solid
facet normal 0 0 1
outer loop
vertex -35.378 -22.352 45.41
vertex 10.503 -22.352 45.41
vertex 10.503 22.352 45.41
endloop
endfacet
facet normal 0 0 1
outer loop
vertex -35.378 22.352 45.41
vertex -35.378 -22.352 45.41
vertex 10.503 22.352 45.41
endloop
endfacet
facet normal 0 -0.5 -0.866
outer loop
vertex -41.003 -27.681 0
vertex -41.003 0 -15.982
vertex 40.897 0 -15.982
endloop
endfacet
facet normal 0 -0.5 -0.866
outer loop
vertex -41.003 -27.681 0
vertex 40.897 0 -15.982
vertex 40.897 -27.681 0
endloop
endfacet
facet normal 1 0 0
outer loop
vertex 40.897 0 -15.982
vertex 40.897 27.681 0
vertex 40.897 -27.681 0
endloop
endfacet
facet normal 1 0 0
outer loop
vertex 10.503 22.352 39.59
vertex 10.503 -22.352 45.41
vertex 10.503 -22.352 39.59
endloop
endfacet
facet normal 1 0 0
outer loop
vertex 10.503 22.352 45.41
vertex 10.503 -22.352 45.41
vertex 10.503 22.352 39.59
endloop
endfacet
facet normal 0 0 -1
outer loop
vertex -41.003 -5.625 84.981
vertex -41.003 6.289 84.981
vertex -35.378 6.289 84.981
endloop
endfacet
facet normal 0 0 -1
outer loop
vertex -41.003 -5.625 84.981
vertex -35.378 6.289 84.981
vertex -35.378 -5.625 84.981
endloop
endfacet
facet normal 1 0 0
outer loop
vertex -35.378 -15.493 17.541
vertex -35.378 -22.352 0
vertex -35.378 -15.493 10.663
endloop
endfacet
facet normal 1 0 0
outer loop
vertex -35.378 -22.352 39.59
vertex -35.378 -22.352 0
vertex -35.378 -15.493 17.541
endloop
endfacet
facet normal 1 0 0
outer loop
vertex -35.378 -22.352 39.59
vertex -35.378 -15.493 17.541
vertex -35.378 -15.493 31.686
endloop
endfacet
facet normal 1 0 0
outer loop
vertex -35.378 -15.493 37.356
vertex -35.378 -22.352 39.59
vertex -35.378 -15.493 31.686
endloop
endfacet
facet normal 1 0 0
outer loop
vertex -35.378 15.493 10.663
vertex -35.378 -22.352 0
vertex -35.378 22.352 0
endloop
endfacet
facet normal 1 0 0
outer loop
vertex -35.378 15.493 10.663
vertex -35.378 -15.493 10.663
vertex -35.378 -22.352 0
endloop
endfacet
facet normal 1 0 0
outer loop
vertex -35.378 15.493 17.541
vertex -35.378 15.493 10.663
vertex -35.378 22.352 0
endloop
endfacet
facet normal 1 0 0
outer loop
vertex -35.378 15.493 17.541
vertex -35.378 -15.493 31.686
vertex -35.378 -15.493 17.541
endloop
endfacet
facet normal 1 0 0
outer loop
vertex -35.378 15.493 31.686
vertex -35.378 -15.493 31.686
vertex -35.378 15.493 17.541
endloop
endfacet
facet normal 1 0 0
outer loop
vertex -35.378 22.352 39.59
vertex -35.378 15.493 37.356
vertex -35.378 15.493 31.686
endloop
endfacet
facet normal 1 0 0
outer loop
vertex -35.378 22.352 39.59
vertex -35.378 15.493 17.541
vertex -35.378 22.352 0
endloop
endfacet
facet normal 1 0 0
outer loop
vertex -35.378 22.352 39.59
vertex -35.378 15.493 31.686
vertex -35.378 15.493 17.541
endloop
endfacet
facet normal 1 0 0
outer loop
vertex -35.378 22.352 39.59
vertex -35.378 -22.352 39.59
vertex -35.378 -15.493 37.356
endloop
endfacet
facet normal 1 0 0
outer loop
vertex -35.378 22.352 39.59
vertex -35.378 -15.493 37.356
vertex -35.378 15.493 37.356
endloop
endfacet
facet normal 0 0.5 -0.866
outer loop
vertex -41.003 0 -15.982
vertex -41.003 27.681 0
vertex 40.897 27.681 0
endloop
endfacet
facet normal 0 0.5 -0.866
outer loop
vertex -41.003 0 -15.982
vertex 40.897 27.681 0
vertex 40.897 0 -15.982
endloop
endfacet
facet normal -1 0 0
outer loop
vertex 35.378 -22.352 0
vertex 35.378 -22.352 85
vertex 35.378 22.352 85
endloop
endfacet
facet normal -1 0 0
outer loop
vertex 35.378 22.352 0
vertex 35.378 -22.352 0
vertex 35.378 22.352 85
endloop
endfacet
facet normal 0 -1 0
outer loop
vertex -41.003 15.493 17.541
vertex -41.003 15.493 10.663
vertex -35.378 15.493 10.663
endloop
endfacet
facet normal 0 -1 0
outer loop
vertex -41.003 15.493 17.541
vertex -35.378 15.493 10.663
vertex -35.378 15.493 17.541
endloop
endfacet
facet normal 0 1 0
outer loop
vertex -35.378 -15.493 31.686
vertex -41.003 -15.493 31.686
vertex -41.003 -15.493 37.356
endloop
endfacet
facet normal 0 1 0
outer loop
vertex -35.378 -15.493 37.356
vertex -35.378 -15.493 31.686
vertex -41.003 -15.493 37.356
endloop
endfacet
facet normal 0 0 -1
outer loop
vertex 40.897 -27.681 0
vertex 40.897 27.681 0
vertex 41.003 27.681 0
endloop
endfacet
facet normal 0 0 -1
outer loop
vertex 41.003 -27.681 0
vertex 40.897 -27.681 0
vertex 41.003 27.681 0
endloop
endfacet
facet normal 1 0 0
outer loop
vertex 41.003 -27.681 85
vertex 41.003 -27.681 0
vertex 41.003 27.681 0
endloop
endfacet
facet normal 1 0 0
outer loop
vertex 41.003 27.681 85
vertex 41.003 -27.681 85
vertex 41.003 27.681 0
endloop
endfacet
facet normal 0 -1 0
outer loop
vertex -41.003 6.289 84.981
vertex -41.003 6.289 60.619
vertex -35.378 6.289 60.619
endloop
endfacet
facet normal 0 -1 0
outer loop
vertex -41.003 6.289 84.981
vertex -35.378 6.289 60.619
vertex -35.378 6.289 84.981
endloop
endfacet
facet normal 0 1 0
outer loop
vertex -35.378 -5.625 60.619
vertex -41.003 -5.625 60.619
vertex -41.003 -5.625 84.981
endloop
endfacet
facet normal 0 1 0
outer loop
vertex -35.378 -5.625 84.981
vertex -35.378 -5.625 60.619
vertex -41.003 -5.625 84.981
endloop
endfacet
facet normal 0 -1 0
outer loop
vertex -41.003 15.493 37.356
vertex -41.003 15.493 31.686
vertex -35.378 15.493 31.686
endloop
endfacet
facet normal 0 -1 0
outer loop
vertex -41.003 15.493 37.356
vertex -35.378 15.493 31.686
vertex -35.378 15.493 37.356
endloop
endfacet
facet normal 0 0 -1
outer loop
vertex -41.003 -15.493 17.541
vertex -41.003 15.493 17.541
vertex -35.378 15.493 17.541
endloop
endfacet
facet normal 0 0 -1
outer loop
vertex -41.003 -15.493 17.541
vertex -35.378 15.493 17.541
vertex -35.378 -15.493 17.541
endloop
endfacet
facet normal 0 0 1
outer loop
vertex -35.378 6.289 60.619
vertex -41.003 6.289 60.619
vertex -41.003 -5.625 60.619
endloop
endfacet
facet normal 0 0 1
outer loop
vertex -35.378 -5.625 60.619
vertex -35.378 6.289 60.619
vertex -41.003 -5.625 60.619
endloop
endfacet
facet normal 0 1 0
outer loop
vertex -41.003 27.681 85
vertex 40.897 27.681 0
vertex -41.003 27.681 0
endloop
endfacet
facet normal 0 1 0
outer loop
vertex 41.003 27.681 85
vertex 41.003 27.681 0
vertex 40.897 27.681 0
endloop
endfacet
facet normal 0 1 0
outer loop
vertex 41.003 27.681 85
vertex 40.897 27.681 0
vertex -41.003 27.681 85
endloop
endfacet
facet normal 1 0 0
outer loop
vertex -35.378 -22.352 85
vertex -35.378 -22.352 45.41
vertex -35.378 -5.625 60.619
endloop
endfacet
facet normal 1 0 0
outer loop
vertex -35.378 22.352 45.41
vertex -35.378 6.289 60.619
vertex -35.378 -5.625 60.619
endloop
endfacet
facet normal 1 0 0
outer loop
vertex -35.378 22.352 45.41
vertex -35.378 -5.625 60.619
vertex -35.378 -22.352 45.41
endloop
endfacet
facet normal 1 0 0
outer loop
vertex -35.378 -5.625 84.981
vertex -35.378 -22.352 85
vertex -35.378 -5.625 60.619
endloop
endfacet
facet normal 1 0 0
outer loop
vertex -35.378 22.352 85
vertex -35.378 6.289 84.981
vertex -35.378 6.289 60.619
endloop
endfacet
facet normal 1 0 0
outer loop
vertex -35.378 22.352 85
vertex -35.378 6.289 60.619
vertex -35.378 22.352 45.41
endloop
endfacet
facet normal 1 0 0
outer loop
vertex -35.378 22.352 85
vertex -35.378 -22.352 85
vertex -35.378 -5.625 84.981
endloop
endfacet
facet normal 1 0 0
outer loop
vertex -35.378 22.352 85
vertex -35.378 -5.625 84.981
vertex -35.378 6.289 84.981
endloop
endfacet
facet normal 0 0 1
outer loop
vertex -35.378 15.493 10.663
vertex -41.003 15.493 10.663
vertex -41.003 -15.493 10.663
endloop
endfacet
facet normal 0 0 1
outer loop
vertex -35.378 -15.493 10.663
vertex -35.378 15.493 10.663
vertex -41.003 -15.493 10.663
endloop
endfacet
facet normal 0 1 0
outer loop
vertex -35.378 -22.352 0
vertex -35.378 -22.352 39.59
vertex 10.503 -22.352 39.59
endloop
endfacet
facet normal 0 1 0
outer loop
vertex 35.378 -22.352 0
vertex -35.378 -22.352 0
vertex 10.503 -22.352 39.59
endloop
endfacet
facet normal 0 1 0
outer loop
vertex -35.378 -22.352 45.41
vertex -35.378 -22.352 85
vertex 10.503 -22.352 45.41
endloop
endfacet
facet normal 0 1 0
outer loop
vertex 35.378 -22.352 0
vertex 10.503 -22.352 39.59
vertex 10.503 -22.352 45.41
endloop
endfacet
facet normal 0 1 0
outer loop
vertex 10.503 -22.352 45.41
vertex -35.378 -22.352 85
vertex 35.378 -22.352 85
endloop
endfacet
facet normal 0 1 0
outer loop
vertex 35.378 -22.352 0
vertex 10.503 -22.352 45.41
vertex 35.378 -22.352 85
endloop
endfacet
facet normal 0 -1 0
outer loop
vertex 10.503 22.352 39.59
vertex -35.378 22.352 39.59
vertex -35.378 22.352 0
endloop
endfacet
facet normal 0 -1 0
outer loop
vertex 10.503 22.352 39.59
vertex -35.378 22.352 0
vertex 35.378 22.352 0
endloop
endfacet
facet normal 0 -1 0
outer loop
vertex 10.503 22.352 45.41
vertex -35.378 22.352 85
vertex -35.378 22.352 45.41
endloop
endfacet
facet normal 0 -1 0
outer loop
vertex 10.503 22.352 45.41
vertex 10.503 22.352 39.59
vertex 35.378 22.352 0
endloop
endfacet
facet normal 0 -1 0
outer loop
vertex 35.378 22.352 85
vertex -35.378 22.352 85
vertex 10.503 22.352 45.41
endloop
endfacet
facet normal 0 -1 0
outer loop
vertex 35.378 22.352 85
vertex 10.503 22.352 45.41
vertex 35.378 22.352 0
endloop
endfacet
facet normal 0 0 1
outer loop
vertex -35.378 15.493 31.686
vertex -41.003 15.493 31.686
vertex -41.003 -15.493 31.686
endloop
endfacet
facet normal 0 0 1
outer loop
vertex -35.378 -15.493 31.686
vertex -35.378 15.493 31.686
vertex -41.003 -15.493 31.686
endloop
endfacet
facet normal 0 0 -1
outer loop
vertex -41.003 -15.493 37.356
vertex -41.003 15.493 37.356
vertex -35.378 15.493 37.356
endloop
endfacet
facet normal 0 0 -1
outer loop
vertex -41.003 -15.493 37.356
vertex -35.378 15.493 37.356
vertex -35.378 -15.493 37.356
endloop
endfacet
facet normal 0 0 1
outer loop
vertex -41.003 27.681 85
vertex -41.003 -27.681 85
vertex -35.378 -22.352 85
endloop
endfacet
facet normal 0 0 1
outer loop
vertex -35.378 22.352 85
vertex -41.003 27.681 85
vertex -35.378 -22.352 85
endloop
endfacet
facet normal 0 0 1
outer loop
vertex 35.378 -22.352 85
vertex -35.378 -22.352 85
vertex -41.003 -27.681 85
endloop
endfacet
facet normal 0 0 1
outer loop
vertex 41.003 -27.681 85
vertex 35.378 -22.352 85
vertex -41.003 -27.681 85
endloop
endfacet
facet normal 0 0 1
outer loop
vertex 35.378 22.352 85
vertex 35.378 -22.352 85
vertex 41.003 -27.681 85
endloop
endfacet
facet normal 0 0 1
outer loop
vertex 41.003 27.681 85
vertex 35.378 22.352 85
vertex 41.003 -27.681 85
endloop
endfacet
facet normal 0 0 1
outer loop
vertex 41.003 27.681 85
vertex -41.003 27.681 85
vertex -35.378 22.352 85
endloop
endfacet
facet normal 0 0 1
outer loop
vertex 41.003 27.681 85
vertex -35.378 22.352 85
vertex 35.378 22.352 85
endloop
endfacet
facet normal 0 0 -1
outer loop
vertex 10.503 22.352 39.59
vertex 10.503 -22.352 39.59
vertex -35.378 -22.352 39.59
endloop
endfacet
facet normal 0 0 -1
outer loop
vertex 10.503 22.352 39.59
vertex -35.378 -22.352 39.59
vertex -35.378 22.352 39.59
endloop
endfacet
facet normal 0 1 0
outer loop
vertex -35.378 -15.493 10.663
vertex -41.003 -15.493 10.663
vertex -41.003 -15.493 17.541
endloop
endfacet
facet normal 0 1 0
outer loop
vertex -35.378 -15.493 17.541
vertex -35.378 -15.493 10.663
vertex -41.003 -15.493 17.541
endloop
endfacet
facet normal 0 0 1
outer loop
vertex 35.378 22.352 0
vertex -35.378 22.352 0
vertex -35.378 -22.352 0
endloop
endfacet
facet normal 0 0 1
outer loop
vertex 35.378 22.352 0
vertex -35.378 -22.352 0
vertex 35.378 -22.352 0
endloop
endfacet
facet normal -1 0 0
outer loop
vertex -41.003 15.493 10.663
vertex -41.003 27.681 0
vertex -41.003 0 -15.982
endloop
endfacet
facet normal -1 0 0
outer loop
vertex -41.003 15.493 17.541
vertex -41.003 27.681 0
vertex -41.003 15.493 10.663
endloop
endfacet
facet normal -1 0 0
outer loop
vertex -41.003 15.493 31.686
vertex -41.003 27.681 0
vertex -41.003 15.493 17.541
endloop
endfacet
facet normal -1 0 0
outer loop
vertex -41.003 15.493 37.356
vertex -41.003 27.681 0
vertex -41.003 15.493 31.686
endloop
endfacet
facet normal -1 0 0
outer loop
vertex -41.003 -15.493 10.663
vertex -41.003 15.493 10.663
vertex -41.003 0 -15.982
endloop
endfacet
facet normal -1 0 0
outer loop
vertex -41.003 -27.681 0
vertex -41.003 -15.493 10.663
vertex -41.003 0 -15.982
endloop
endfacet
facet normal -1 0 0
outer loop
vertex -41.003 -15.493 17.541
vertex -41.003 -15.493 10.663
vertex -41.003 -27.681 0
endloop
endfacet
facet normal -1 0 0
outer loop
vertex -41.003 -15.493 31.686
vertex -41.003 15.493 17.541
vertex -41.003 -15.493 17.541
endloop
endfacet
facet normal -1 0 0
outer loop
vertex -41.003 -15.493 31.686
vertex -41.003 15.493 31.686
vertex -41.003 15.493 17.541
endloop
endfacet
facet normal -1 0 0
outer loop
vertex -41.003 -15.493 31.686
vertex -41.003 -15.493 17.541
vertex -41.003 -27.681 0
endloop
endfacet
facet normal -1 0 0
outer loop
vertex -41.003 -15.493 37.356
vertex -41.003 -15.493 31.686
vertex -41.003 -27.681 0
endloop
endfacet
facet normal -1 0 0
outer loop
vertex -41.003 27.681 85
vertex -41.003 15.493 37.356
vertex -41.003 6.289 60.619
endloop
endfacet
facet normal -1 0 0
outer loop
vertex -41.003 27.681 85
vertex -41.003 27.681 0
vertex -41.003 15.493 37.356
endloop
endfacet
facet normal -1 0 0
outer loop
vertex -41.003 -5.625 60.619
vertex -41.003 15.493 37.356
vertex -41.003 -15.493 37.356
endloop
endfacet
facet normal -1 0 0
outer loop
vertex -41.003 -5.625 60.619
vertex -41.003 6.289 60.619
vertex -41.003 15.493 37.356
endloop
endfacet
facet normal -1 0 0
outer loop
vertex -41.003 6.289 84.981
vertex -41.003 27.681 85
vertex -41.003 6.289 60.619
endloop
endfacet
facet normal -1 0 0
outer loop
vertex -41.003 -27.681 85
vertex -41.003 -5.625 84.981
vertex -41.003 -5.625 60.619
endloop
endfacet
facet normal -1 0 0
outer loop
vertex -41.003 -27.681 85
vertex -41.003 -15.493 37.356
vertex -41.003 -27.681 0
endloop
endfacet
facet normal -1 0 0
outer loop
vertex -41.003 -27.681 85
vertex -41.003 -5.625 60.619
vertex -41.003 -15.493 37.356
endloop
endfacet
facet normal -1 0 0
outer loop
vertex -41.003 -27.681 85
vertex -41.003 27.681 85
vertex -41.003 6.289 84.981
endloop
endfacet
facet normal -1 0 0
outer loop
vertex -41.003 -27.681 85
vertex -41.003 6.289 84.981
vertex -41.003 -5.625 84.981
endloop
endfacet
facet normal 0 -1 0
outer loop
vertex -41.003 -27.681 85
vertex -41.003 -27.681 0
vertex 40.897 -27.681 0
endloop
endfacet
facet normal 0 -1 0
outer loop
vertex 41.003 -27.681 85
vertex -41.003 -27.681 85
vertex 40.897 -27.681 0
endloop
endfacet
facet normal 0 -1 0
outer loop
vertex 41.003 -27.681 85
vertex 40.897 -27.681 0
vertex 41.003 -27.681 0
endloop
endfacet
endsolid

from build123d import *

# Parameters (mm, degrees)
F0_W     = 82.0065811276
F0_H     = 55.3618445992
F1_DEPTH = 85
F3_DEPTH = 81.9
F4_W     = 70.7565844059
F4_H     = 44.7039492428
F5_DEPTH = 85
F6_W     = 30.9852808714
F6_H     = 6.8782754242
F6_H_2   = 5.6699812412
F6_W_2   = 11.9137810543
F6_H_3   = 24.3619084358
F7_DEPTH = 55
F9_START = -30.5
F8_W     = 55.3618445992
F8_H     = 5.8199772239
F9_DEPTH = 48


with BuildPart() as f1:
    # F0 (on Top) → F1 (new body)
    with BuildSketch(Plane.XY):
        Rectangle(F0_W, F0_H)
    extrude(amount=F1_DEPTH)

    # F2 (on face) → F3 (join)
    with BuildSketch(Plane(origin=(-41.0032905638, 0, 0), x_dir=(0, -1, 0), z_dir=(-1, 0, 0))):
        Polygon((27.6809222996, 0), (-27.6809222996, 0), (0, -15.9815879411), align=None)
    extrude(amount=-F3_DEPTH)

    # F4 (on face) → F5 (cut)
    with BuildSketch(Plane.XY.offset(85)):
        Rectangle(F4_W, F4_H)
    extrude(amount=-F5_DEPTH, mode=Mode.SUBTRACT)

    # F6 (on face) → F7 (cut)
    with BuildSketch(Plane(origin=(-41.0032905638, 0, 0), x_dir=(0, -1, 0), z_dir=(-1, 0, 0))):
        with Locations((0, 14.1018014401)):
            Rectangle(F6_W, F6_H)
        with Locations((0, 34.5212779939)):
            Rectangle(F6_W, F6_H_2)
        with Locations((-0.3322646953, 72.8002712131)):
            Rectangle(F6_W_2, F6_H_3)
    extrude(amount=-F7_DEPTH, mode=Mode.SUBTRACT)

    # F8 (on face) → F9 (join)
    with BuildSketch(Plane.YZ.offset(41.0032905638).offset(F9_START)):
        with Locations((0, 42.5)):
            Rectangle(F8_W, F8_H)
    extrude(amount=-F9_DEPTH)


solid = f1.part
